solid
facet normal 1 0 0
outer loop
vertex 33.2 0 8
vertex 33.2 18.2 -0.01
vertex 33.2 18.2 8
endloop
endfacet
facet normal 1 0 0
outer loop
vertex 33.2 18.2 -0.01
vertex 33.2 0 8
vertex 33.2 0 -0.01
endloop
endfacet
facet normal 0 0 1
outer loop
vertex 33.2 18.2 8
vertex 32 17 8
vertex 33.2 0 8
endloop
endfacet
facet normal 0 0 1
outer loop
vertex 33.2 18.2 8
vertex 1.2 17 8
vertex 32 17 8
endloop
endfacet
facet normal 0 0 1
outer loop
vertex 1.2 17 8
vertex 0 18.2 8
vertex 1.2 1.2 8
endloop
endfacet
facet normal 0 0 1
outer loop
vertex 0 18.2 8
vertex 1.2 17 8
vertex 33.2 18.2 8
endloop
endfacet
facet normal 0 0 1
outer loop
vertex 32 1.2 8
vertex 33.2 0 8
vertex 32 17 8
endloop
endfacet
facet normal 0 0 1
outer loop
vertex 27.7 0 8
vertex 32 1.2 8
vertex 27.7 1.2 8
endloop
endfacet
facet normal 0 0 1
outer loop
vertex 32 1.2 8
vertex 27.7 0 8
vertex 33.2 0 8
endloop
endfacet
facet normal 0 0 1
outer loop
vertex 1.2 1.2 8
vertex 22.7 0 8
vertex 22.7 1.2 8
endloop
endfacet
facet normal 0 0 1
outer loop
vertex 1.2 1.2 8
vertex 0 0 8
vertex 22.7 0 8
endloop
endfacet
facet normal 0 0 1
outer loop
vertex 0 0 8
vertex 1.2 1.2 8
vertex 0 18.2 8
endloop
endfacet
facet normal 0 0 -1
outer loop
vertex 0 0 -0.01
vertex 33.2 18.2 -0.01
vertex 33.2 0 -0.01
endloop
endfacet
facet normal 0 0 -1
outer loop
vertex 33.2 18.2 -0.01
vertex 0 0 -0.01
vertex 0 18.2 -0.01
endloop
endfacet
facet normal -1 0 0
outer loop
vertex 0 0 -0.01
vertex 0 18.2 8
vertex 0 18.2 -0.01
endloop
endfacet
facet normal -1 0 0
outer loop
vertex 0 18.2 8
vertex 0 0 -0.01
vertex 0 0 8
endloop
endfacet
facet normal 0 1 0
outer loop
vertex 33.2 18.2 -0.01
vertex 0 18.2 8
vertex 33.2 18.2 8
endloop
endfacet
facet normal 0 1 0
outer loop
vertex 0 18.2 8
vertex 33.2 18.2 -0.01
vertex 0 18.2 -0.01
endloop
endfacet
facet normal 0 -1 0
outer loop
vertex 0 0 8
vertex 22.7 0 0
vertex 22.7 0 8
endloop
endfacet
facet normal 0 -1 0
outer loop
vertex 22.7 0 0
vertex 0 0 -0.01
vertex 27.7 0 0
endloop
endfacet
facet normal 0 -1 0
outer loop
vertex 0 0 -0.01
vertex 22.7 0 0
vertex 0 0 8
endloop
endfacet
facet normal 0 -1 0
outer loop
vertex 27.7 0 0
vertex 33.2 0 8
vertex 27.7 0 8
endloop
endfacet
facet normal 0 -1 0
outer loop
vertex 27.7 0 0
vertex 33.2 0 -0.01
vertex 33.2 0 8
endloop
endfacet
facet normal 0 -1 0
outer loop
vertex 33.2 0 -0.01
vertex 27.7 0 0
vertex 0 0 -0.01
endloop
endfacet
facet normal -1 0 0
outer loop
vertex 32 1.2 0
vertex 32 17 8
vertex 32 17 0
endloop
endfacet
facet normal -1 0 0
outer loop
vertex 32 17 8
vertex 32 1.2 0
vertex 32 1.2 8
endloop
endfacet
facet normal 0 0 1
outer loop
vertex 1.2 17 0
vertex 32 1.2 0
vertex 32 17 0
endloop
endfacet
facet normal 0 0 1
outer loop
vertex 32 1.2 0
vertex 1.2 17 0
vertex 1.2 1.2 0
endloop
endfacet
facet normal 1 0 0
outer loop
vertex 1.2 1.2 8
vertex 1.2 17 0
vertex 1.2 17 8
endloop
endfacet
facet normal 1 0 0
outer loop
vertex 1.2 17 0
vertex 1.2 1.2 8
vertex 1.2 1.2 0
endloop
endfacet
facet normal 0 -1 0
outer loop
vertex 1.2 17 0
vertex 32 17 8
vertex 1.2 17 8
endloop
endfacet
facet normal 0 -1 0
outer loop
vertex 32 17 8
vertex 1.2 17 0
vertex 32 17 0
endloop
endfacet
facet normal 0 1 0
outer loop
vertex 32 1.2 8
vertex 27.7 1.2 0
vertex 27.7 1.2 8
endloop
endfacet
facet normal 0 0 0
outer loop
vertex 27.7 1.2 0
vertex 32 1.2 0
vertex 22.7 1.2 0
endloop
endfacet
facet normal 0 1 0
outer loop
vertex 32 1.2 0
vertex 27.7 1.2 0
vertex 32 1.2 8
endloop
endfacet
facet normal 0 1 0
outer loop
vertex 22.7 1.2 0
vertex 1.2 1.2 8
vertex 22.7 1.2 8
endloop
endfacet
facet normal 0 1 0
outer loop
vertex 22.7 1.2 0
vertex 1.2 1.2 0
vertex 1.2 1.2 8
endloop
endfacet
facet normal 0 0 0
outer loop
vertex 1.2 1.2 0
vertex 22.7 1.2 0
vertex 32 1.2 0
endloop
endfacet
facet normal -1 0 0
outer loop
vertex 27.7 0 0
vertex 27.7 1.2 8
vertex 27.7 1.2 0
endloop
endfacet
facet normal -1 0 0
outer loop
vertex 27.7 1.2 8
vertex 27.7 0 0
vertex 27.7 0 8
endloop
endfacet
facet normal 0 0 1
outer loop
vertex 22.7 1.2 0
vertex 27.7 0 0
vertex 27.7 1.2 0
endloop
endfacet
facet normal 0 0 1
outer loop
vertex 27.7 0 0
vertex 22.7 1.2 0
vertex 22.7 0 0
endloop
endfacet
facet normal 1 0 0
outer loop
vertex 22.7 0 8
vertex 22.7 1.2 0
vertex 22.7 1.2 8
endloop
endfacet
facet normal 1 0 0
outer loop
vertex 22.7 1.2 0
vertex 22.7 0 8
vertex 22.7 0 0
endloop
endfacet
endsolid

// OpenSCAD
// file: ../Base/Boxes.scad
// Fischertechnik Box Foundation
// Pre-designed Boxes

use <Constants.scad>

include <PlacementOptions.scad>

box190Width = 190;
box190Depth = 130;
box130Width = 130;
box130Depth = 95;
boxUsageHeight = 33.9;
boxWallThickness = 2.4;
boxBaseThickness = 1.0;

// getBoxWallThickness()
// Gets the wall thickness of a Fischertechnik Box

function getBoxWallThickness() = boxWallThickness;

// Gets the usable height of a fischertechnik box
function getBoxUsageHeight() = boxUsageHeight;

// Gets the thickness of the Fischertechnik box base.
function getBoxBaseThickness() = boxBaseThickness;

// Gets the usable inner space of a Box 190 as an x/y-list
function getBox190Space() = [
    box190Width - 2*getBoxWallThickness(), 
    box190Depth - 2*getBoxWallThickness() ];

// Imports the Fischertechnik empty box 130x190 mm and places it at position 0,0
// 190x130 are the outer sizes, the inner space is slightly smaller. Use getBox190Space() to get the inner sizes.
// This module needs the STL file "Fischertechnik Box 130x190.stl" in the library path.
// The box is positioned that the usable inner space is at the 0,0,0 position. The

module Box190() {
    translate([-getBoxWallThickness(),-getBoxWallThickness(),-getBoxBaseThickness()])
        import("Fischertechnik Box 130x190.stl", convexity=3);
}

// Gets the usable inner space of a Box 130 as an x/y-list
function getBox130Space() = [
    box130Width - 2*getBoxWallThickness(), 
    box130Depth - 2*getBoxWallThickness() ];

// Imports the Fischertechnik empty box 95x130 mm and places it at position 0,0
// 190x130 are the outer sizes, the inner space is slightly smaller. Use getBox190Space() to get the inner sizes.
// This module needs the STL file "Fischertechnik Box 95x130.stl" in the library path.
// The box is positioned that the usable inner space is at the 0,0,0 position. The

module Box130() {
    translate([-getBoxWallThickness(),-getBoxWallThickness(),-getBoxBaseThickness()])
        import("Fischertechnik Box 95x130.stl", convexity=3);
}

// Creates a web at the specified box walls
// corner 0 = LowerLeft, 1 = UpperLeft, 2 = UpperRight, 3 = LowerRight
// side 0 = LeftOfCorner, 1 = RightOfCorner
// distance = Distance in mm from the corner
// box = inner width and depth of the box (default: Box 190)
// webWidth = length of the web (default is 3 mms)
// webThickness = thickness of the web (default is 1 mm)

module BoxWeb(corner, side, distance, box=getBox190Space(), webWidth=3, webThickness=1.0) {
    sink = getBoxWallThickness()/2;

    width = (corner % 2 == 0) ? 
            (side == LeftOfCorner ? webWidth : webThickness) :
            (side == LeftOfCorner ? webThickness : webWidth);

    depth = (corner % 2 == 0) ? 
            (side == RightOfCorner ? webWidth : webThickness) :
            (side == RightOfCorner ? webThickness : webWidth);
    
    xDiff = corner == LowerLeft ? 
                (side == LeftOfCorner ? -sink : distance) :
            (corner == UpperLeft ?                
                (side == LeftOfCorner ? distance : -sink) :
            (corner == UpperRight ?
                (side == LeftOfCorner ? box.x-webWidth+sink : box.x-distance-webThickness) :
                (side == LeftOfCorner ? box.x-distance-webThickness: box.x-webWidth+sink)));

    yDiff = corner == LowerLeft ? 
                (side == RightOfCorner ? -sink : distance) :
            (corner == UpperLeft ?
                (side == RightOfCorner ? box.y-distance : box.y-webWidth+sink) :
            (corner == UpperRight ?
                (side == RightOfCorner ? box.y-webWidth+sink : box.y-distance) :
                (side == RightOfCorner ? distance : -sink)));
    
    translate([xDiff, yDiff, -getExcess()])
        cube([width, depth, boxUsageHeight + 2*getExcess()]);
}
// file: ../Base/Rotation.scad
// Fischertechnik Box Foundation
// Geometry Helpers Rotation

include <PlacementOptions.scad>

// getRotatedSpace(space, rotation=NoRotation)
// Rotates the space dependent on the specified rotation

function getRotatedSpace(space, rotation=NoRotation) = [
    (rotation == Rotate90 || rotation == Rotate270) ? space.y : space.x,
    (rotation == Rotate90 || rotation == Rotate270) ? space.x : space.y
];

// Rotates the given space around the fixed left lower corner
// space = the space the children needs as width/depth list [width,depth]
// rotation = 0 Rotate0 degrees, 1 Rotate90 degrees, 2 Rotate180 degrees, 3 Rotate270 degrees (equivalent to -90)

module RotateFix(space, rotation=Rotate0) {
    dy = (rotation == Rotate0 || rotation == Rotate270) ? 0 :
        (rotation == Rotate90) ? space.x :
        space.y;
    dx = (rotation < Rotate180) ? 0 :
        (rotation == Rotate180) ? space.x :
        space.y;
    
    translate([dx, dy, 0])
        rotate([0, 0, rotations[rotation]])
            children();
}
// file: ../Base/Alignment.scad
// Fischertechnik Box Foundation
// Geometry Helpers Alignment

include <PlacementOptions.scad>

// getAlignedX(elementWidth, spaceWidth, align=AlignRight, offset=0)
// Gets the aligned X offset of an element with the given
// width in the given space.
// elementWidth = The width of the element to positon
// spaceWidth = The space where the element should be aligned
// align = 0 AlignLeft, 1 AlignCenter, 2 AlignRight
// offset = an optional offset from the aligned position. When
// aligned left or centered, then positive values are in X direction.
// When aligned right then positive values are in negative X direction.

function getAlignedX(elementWidth, spaceWidth, align=AlignRight, offset=0) =
    (align == AlignLeft) ?
        offset :
        ((align == AlignCenter) ?
        (spaceWidth - elementWidth)/2 + offset :
        spaceWidth - offset - elementWidth);

// getAlignedY(elementDepth, spaceDepth, align=AlignTop, offset=0)
// Gets the aligned Y offset of an element with the given
// depth in the given space.
// elementDepth = The depth of the element to positon
// spaceDepth = The space where the element should be aligned
// align = 0 AlignBottom, 1 AlignCenter, 2 AlignTop
// offset = an optional offset from the aligned position. When
// aligned bottom or centered, then positive values are in Y direction.
// When aligned top then positive values are in negative Y direction.

function getAlignedY(elementDepth, spaceDepth, align=AlignTop, offset=0) =
    (align == AlignBottom) ?
        offset :
        ((align == AlignCenter) ?
        (spaceDepth - elementDepth)/2 + offset :
        spaceDepth - offset - elementDepth);
// file: ../Base/PlacementOptions.scad
// Fischertechnik Box Foundation
// Placement Options

// Alignment
NoAlign = 0;
AlignLeft = 1;
AlignBottom = 2;
AlignCenter = 3;
AlignRight = 4;
AlignTop = 5;

// Element rotation degree steps
rotations = [0, -90, -180, -270];

// Rotation
NoRotation = 0;
Rotate0 = 0;
Rotate90 = 1;
Rotate180 = 2;
Rotate270 = 3;

// Docking (seen from above)
NoDock = -1;
DockLeft = 0;
DockTop = 1;
DockRight = 2;
DockCorner = 2;
DockBottom = 3;

// Web corners
LowerLeft = 0;
UpperLeft = 1;
UpperRight = 2;
LowerRight = 3;

// Web position relative to corner
LeftOfCorner = 0;
RightOfCorner = 1;
// file: ../Base/Placement.scad
// Fischertechnik Box Foundation
// Geometry Helpers Placement

use <Constants.scad>
use <Alignment.scad>
use <Rotation.scad>
use <Boxes.scad>

include <PlacementOptions.scad>

// Place(x=0, y=0, elementSpace=[0,0], alignX=AlignLeft, alignY=AlignBottom, rotation=Rotate0, boxSpace=getBox190Space())
// Places the child at the specified position
// y = Y-Position. This is a relative position when an X aligment is specified.
// x = X-Position. This is a relative position when an Y aligment is specified.
// elementSpace = space of the element to be placed [x,y]
// alignX = -1=NoAlign, 0 AlignLeft, 1 AlignCenter, 3 AlignRight (elementSpace and boxSpace required!)
// alignY = -1=NoAlign, 2 AlignBottom, 1 AlignCenter, 4 AlignTop (elementSpace and boxSpace required!)
// rotation = 0 Rotate0 0 degrees, 1 Rotate90 90 degrees, 
// 2 Rotate180 180 degrees, 3 Rotate270 270 degrees (equivalent to -90)
// boxSpace = Inner space of the box where the placement occurs [x,y] - default is Box 190x130 inner space

module Place(x=0, y=0, elementSpace=[0,0], 
  alignX=AlignLeft, alignY=AlignBottom, 
  rotation=NoRotation, boxSpace=getBox190Space()) {

    module Position(x, y, space, rotation=Rotate0) {
        translate([x, y, 0])
            RotateFix(space, rotation)
                children(0);
    }

    space = getRotatedSpace(elementSpace, rotation);
    alignedX = getAlignedX(space.x, boxSpace.x, alignX, x);
    alignedY = getAlignedY(space.y, boxSpace.y, alignY, y);
    Position(alignedX, alignedY, elementSpace, rotation)
        children(0);
}

// Center(space=getBox130Space(), elementSpace=[0,0])
// space = Space where the children is centered. For cylinder use centered=true and no elementSpace.
// elementSpace = space of the element to be centered [x,y]

module Center(space=getBox190Space(), elementSpace=[0,0]) {
    translate([(space.x - elementSpace.x) / 2, (space.y - elementSpace.y) / 2])
        children(0);
}

// CenterHorizontal(width=0, y=0, offset=0, space=getBox130Space())
// space = Space where the children is centered. For cylinder use centered=true and no elementSpace.
// elementSpace = space of the element to be centered [x,y]

module CenterHorizontal(width=0, y=0, offset=0, space=getBox190Space()) {
    translate([(space.x - width) / 2 + offset, y])
        children(0);
}

// CenterVertical(depth=0, x=0, offset=0, space=getBox130Space())
// space = Space where the children is centered. For cylinder use centered=true and no elementSpace.
// elementSpace = space of the element to be centered [x,y]

module CenterVerticalal(depth=0, x=0, offset=0, space=getBox190Space()) {
    translate([x, (space.y - depth) / 2 + offset])
        children(0);
}
// file: ../Base/Constants.scad
// Fischertechnik Box Foundation
// Constants

// Constant values necessary for multiple elements

// Base constants
dividerThickness = 1.2;
excess = 0.01;
fragments = 90;
tolerance = 0.8;

// Gets the thickness of a divider 
function getDividerThickness() = dividerThickness;

// Gets the excess that is used to merge walls into each other
function getExcess() = excess;

// Gets amount of fragments of a cylinder
function getFragments() = fragments;

// Gets the inner tolerance of a frame to each side
function getTolerance() = tolerance;


// Fischertechnik specific constants
axisDiameter = 4;
axisBottomDiameter = axisDiameter + 1;
standardEdgeDistance = 2.5;
standardWebDistance = 11.5;
standardCornerLength = 15;
tubeWallFactor = 1.6;

// Gets axis diameter
function getAxisDiameter() = axisDiameter;

// Gets axis bottom diameter for thicker part at the bottom
function getAxisBottomDiameter() = axisBottomDiameter;

// gets the standard distance to the wall of the box for dockable frames with webs
function getStandardEdgeDistance() = standardEdgeDistance;

// gets the standard distance of each web to the corner of the dockable frame
function getStandardWebDistance() = standardWebDistance;

// gets the standard length of the corner walls of a dockable frame
function getStandardCornerLength() = standardCornerLength;

// gets the wall thickness of a tube.
function getTubeWallThickness() = tubeWallFactor * getDividerThickness();
// main file
// Fischertechnik Box Library
// Frame for Light Tube
// 31363

use <../Base/Constants.scad>
use <../ModelBase/Simple.scad>

width = 30;
depth = 15;
height = 8;

// getFrameLightTubeSpace()
// Gets the space the frame for light tube needs as width (.x and .y as a list)

function getFrameLightTubeSpace() = getFrameOuterVolume([width, depth, height]);

// FrameLightTube()
// Frame for light tube

module FrameLightTube() {
    gapWidth = 5;
    gapDistance = 3.5;
    
    difference() {
        Frame([width, depth, height]);
        translate([width-gapDistance-gapWidth+getDividerThickness(),-getDividerThickness()/2,0])
            cube([gapWidth, getDividerThickness()*2, height + 1]);
    }
}

// Test
color("lightgray") {
    FrameLightTube();
}
